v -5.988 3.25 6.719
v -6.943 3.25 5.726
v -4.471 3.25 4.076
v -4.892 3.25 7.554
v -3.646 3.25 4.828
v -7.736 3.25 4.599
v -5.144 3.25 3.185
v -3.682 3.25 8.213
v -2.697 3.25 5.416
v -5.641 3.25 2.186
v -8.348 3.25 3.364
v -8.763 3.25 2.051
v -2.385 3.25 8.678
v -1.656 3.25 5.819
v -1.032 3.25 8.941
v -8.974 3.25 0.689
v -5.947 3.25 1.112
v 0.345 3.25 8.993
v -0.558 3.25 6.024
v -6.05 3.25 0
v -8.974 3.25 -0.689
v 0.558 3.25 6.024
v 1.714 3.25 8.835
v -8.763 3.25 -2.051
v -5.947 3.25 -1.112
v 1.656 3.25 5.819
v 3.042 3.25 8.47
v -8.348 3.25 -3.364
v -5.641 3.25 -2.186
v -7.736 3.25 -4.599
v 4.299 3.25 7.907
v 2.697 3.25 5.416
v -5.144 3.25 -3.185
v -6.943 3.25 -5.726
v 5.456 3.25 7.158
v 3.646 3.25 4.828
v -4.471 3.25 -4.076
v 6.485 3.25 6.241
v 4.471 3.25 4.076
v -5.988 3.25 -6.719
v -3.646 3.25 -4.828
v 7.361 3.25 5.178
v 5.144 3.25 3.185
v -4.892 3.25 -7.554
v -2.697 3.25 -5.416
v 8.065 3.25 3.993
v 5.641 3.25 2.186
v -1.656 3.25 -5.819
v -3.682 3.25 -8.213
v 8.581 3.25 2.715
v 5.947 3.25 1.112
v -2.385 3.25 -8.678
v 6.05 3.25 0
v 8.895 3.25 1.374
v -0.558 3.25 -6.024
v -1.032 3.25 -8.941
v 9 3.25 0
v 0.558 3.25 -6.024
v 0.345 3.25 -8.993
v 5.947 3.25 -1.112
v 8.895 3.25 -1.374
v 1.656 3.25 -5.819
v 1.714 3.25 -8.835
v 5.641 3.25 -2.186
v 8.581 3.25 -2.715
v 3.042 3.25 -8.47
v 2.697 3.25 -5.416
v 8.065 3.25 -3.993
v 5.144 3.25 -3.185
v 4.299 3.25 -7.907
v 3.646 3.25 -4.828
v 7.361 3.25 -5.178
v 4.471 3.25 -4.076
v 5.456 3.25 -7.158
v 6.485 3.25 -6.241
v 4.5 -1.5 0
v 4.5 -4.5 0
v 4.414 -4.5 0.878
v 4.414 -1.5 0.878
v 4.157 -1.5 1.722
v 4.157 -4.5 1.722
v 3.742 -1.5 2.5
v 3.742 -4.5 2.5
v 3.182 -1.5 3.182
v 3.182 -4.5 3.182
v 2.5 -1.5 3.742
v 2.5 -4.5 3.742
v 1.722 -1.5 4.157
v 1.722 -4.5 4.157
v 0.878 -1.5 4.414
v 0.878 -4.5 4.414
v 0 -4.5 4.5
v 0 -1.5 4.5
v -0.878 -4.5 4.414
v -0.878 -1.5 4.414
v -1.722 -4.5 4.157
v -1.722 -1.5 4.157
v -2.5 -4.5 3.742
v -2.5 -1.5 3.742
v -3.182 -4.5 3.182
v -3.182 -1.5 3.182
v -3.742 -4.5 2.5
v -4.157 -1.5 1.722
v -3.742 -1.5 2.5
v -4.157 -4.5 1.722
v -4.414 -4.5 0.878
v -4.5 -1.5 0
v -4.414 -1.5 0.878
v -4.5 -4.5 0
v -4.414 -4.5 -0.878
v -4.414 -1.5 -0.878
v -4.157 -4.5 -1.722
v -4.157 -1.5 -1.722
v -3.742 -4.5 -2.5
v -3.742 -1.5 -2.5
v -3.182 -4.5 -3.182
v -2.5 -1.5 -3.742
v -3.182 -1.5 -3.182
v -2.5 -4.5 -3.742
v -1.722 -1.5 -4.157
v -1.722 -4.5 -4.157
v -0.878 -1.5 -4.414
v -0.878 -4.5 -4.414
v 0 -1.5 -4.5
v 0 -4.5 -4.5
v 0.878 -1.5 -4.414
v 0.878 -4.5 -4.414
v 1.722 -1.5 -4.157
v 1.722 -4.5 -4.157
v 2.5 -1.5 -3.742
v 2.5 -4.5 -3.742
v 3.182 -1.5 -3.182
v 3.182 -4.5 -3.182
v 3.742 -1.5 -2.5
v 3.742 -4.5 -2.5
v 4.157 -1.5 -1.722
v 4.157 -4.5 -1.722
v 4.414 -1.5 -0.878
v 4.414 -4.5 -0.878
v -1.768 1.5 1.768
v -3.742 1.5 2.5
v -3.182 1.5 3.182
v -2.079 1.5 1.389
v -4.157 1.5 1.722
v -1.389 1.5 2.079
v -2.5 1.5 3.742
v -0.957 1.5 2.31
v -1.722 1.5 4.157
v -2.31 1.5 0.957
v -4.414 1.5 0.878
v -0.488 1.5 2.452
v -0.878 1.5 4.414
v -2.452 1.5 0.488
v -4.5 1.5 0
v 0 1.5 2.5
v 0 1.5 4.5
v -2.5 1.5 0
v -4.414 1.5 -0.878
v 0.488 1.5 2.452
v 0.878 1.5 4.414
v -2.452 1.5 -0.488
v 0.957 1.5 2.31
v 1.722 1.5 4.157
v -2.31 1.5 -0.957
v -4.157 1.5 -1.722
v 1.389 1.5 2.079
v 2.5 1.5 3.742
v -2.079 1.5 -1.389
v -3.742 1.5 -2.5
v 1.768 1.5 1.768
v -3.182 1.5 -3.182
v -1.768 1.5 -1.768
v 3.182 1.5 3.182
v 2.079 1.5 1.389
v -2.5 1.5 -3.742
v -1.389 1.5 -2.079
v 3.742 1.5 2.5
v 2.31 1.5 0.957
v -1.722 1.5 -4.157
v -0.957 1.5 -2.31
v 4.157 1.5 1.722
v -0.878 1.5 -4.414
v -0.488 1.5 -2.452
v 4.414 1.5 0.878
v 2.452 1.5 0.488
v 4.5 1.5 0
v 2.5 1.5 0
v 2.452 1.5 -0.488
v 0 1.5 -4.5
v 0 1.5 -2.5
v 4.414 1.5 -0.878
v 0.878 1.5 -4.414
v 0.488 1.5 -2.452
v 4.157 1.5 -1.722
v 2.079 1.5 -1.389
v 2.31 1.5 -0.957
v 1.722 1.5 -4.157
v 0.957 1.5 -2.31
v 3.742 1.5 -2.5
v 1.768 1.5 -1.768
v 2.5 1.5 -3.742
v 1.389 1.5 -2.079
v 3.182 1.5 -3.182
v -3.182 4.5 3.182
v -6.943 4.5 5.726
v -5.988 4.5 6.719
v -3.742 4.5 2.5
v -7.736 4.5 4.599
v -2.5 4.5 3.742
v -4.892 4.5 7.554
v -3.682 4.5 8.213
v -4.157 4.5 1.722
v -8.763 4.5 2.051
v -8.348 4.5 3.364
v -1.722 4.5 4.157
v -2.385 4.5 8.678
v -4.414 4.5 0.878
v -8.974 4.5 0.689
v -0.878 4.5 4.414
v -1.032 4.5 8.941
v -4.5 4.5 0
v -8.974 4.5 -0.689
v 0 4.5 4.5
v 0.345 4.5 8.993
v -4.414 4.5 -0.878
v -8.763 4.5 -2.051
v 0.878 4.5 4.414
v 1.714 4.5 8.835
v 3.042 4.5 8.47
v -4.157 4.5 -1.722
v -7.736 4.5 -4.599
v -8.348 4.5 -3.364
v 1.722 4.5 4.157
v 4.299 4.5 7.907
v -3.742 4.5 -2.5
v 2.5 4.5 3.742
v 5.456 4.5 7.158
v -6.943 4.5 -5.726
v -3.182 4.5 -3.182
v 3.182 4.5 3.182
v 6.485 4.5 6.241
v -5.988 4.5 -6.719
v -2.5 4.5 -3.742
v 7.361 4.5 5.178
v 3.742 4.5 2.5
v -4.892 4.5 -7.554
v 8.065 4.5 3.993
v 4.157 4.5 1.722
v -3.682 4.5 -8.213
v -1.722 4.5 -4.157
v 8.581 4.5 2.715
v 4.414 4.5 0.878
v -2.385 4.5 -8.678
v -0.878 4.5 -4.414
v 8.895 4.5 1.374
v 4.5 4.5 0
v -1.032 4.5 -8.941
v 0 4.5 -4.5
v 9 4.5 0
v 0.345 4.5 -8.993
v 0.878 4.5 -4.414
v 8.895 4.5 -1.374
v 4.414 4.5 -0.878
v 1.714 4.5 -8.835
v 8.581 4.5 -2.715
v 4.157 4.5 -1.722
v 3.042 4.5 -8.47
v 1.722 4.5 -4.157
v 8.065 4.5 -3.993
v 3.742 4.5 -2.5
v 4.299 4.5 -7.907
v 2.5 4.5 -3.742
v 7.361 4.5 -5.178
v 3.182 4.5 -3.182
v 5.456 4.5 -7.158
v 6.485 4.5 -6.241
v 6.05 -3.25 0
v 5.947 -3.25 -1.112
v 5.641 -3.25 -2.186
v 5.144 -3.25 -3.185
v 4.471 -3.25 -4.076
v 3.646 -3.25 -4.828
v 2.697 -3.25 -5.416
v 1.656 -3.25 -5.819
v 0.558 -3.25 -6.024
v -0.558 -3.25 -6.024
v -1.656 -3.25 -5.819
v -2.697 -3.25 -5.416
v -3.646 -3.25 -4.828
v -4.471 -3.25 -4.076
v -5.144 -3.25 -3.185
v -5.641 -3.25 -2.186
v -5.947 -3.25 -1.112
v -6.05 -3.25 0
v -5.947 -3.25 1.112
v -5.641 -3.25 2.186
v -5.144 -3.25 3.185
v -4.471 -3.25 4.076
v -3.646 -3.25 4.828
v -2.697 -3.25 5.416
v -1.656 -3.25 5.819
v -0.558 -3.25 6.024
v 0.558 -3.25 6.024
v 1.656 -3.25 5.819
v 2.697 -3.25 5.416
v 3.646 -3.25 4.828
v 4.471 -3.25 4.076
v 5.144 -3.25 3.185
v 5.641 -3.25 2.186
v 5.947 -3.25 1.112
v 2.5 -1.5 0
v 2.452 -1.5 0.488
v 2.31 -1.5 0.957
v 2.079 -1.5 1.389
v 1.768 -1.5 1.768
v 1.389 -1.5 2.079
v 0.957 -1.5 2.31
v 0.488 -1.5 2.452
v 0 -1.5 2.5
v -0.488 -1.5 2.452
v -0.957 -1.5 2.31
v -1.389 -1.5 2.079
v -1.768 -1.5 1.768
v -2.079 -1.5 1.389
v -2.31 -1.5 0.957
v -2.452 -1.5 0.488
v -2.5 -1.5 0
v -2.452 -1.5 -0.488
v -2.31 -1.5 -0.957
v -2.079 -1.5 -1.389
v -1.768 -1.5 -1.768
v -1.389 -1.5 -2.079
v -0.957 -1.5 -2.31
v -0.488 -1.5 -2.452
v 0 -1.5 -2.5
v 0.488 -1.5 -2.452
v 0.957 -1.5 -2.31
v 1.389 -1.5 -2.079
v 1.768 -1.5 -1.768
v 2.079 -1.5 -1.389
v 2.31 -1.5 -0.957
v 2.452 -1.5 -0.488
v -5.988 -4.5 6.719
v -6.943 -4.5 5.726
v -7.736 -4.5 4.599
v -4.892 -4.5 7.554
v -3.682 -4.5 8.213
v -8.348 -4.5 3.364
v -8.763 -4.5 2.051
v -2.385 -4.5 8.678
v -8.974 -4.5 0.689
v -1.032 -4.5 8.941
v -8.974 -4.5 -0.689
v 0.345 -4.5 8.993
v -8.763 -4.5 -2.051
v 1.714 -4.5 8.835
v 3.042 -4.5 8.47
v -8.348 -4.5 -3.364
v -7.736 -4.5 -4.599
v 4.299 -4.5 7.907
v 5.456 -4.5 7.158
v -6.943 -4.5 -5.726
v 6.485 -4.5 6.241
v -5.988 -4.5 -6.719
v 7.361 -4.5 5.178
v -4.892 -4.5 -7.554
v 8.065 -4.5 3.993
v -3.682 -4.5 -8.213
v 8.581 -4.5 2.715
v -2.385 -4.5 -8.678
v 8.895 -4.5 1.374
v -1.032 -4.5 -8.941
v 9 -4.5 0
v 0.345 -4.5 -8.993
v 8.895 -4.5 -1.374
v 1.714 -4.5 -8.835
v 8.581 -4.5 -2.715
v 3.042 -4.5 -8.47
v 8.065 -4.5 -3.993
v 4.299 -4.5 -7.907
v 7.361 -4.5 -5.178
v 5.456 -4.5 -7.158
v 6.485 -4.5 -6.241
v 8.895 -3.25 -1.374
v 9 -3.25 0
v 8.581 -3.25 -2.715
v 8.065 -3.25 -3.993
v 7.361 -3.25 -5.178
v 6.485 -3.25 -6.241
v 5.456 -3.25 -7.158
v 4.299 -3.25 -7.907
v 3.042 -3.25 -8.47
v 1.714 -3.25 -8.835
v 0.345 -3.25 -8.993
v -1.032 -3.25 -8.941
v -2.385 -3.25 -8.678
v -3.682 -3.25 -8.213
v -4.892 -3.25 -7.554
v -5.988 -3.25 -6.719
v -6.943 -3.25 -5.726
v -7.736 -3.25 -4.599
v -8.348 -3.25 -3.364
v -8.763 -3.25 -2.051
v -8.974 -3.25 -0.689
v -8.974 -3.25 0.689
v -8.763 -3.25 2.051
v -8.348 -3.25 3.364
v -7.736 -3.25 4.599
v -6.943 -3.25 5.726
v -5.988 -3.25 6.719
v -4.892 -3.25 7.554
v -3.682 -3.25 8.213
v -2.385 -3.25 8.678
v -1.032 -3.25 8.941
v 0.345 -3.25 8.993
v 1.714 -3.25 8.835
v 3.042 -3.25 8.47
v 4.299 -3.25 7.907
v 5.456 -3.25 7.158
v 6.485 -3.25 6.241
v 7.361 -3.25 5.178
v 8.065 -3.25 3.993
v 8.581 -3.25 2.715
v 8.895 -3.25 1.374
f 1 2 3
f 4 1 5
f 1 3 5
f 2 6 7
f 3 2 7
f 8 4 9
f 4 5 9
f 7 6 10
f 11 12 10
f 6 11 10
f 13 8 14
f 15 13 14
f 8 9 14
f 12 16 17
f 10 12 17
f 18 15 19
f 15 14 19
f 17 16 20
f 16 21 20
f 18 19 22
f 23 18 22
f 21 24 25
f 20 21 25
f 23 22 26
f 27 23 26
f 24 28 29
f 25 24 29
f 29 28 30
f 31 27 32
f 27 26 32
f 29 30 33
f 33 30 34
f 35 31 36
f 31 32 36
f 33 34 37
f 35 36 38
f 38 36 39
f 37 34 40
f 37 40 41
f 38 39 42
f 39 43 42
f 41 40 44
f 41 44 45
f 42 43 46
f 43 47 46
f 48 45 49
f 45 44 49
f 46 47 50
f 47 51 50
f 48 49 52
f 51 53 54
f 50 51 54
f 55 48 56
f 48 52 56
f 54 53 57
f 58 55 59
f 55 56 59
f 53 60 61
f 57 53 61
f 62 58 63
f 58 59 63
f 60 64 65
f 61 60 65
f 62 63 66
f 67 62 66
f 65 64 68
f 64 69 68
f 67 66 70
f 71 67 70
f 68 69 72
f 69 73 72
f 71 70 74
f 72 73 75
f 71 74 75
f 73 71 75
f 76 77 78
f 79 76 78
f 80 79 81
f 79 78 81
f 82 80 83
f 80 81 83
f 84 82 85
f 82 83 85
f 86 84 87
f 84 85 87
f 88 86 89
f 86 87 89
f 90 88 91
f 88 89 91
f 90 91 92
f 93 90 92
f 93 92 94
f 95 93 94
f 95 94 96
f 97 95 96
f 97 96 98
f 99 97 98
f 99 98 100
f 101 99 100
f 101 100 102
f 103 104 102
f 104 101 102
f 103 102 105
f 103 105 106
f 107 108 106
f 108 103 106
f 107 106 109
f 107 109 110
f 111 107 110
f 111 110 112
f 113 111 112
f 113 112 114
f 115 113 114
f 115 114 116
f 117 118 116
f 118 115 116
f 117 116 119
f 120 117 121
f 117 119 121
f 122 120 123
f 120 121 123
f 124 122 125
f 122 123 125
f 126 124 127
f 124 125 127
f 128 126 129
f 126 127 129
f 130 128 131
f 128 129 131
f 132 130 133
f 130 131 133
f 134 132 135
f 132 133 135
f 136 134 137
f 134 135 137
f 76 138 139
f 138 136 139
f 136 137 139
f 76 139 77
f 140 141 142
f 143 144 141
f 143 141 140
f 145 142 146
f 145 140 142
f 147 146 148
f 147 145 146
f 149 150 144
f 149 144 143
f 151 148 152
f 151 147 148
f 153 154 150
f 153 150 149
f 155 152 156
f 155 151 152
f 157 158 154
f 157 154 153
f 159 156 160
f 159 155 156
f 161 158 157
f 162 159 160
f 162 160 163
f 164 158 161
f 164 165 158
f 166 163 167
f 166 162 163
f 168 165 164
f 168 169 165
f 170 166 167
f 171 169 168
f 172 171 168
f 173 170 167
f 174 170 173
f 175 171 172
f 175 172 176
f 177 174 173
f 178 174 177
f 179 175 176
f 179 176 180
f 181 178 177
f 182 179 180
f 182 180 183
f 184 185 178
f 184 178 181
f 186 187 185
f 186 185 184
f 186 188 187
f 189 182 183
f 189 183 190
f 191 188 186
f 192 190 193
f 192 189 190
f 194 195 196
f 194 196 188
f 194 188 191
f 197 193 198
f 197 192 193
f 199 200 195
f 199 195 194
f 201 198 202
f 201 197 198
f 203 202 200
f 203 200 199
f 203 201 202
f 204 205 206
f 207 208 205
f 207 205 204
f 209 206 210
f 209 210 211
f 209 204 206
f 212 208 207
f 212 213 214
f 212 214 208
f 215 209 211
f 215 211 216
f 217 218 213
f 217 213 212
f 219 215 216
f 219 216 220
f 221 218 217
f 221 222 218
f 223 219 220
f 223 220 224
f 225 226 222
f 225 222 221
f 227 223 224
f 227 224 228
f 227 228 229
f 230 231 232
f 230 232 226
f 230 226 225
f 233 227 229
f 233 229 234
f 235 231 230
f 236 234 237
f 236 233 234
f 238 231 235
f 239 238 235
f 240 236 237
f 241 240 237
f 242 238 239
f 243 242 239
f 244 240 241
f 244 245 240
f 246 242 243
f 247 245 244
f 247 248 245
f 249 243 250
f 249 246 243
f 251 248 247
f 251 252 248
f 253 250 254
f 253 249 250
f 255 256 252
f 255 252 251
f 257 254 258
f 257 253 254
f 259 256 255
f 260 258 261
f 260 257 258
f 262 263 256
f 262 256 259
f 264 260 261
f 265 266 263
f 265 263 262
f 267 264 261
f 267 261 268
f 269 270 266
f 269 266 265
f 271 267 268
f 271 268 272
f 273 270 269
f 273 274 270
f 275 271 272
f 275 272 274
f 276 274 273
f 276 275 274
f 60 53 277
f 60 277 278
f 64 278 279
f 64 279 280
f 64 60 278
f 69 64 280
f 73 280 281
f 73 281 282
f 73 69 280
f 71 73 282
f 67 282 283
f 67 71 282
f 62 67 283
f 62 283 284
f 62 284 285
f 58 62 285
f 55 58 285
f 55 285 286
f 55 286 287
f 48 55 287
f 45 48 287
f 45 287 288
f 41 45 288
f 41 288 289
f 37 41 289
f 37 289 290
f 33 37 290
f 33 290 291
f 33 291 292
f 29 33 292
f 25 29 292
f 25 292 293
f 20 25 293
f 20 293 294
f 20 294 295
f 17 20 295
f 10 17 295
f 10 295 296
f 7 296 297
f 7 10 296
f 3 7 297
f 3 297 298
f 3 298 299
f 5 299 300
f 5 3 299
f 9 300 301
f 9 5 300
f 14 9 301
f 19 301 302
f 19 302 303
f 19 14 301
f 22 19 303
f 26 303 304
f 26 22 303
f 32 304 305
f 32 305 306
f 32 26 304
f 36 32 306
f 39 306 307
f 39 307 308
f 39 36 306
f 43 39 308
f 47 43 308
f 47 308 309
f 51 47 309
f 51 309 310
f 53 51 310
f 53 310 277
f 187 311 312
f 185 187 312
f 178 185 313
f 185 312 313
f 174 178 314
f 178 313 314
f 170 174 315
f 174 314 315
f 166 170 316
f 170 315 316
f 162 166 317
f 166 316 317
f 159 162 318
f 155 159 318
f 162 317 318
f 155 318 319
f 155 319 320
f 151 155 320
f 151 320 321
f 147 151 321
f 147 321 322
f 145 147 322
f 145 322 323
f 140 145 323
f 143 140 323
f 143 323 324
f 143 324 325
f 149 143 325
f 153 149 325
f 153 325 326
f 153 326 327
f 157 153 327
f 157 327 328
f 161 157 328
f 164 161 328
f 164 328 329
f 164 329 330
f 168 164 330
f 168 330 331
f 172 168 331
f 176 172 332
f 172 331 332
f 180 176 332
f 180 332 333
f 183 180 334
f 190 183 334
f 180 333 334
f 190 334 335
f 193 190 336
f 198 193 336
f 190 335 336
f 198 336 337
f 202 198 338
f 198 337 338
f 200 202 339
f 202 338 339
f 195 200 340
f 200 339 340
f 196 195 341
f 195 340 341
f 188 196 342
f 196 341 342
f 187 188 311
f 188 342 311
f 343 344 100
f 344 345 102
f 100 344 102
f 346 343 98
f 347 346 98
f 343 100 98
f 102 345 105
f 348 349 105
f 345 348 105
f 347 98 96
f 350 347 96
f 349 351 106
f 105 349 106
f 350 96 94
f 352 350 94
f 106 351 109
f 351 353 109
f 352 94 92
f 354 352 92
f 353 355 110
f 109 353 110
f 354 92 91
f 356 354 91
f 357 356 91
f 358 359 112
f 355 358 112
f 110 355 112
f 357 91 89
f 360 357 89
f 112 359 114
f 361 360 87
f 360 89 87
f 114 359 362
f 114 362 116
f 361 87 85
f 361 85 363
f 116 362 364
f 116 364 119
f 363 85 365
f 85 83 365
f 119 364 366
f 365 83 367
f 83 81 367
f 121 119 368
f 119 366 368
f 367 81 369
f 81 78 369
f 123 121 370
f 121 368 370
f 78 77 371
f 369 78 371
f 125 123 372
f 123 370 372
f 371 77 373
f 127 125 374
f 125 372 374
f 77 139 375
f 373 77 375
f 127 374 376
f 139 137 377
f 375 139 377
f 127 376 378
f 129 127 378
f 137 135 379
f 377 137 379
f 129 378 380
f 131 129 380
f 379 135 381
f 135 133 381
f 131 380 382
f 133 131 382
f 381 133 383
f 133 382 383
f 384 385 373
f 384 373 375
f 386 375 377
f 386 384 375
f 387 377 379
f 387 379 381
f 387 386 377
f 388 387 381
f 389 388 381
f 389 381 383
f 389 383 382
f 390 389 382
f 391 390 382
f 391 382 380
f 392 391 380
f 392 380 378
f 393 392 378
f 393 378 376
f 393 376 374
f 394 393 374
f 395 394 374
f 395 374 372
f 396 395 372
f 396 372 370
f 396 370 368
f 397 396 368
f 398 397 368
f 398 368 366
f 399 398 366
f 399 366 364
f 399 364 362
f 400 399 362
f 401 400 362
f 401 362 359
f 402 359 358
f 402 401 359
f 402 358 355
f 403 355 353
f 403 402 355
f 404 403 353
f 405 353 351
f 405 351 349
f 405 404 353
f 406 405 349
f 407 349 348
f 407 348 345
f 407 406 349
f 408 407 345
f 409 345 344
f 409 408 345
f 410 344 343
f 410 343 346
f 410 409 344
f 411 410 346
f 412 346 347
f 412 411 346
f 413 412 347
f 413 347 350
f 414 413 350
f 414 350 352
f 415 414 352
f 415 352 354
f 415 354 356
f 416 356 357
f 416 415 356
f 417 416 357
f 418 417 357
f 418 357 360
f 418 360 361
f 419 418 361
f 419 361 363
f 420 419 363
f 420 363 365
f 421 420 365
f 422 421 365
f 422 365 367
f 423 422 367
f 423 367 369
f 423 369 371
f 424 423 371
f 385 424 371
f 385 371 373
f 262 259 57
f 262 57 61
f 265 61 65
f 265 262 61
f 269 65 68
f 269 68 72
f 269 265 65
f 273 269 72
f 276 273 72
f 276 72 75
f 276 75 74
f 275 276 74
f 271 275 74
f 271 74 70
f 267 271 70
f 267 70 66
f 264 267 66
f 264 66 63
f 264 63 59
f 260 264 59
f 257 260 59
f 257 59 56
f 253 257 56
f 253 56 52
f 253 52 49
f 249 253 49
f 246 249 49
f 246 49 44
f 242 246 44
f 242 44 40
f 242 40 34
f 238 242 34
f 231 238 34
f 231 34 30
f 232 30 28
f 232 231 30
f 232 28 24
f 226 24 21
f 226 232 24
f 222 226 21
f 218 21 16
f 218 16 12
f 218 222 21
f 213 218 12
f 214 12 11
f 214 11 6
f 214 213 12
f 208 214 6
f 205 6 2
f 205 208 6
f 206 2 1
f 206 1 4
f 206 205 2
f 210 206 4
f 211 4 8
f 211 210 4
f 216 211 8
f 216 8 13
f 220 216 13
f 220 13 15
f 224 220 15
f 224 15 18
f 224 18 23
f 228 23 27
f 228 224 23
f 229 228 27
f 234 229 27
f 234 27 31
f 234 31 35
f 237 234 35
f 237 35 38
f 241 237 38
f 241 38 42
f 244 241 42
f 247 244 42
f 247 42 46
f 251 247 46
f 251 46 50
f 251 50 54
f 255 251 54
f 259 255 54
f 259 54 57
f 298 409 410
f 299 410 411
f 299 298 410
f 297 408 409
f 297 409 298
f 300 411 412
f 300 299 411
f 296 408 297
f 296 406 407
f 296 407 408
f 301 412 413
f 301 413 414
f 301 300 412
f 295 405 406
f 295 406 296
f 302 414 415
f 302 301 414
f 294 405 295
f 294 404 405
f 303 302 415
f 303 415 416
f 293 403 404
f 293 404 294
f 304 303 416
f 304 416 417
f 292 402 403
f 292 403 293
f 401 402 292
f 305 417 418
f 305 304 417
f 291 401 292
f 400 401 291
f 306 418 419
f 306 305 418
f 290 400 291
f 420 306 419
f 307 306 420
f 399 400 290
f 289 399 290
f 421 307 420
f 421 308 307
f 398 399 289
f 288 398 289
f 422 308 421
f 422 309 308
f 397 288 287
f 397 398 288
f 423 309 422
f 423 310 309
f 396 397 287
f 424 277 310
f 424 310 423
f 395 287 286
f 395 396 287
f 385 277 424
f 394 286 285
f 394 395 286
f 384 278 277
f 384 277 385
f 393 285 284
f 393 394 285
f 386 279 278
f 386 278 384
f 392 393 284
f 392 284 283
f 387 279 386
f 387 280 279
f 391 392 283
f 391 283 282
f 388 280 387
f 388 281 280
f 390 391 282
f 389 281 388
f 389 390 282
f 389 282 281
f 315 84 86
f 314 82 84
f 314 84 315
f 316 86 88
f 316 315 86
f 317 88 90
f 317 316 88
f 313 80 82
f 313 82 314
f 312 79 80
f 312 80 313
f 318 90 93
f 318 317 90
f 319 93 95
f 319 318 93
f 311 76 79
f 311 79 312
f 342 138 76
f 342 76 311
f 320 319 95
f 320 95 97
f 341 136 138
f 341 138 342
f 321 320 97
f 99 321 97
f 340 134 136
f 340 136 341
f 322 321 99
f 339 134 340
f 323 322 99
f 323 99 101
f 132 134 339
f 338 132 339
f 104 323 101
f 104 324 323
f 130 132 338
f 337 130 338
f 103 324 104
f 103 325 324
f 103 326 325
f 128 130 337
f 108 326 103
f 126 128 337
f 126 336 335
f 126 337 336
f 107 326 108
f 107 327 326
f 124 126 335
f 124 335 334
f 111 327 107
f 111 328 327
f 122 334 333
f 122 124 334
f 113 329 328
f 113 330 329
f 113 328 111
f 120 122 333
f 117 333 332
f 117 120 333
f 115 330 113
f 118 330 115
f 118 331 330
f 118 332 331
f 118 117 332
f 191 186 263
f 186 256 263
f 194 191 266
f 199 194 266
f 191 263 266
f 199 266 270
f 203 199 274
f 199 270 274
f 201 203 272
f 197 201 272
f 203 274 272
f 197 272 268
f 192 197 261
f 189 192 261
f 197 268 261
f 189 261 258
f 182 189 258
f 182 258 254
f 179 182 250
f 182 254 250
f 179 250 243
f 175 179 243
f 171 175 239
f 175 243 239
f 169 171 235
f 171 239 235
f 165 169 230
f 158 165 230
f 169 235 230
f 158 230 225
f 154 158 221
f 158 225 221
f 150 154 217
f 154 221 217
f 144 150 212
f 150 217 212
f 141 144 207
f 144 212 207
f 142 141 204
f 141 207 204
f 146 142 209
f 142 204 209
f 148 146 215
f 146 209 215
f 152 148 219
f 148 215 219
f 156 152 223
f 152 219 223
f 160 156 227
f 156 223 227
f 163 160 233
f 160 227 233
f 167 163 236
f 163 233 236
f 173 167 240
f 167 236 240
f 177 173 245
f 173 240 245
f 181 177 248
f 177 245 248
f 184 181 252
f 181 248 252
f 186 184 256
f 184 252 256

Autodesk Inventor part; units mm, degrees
ref_plane "YZ Plane" through (0, 0, 0) normal (1, 0, 0) x (0, 1, 0)
ref_plane "XZ Plane" through (0, 0, 0) normal (0, 1, 0) x (-1, 0, 0)
ref_plane "XY Plane" through (0, 0, 0) normal (0, 0, 1) x (1, 0, 0)
sketch "Sketch1" plane through (0, 0, 0) normal (0, 0, 1) x (1, 0, 0)
  line L0 (0, 0) -> (2.5, 0) construction
  line L1 (2.5, 4.5) -> (2.5, -4.5)
  line L2 (2.5, -4.5) -> (9, -4.5)
  line L3 (9, -4.5) -> (9, -3.25)
  line L4 (9, -3.25) -> (6.05, -3.25)
  line L5 (6.05, -3.25) -> (6.05, 3.25)
  line L6 (6.05, 3.25) -> (9, 3.25)
  line L7 (9, 3.25) -> (9, 4.5)
  line L8 (9, 4.5) -> (2.5, 4.5)
  line L9 (0, -6.3) -> (0, 6.3) projected
  dimension "d0" = 2.5
  dimension "d1" = 6.5
  dimension "d2" = 9
  dimension "d3" = 9
  dimension "d4" = 6.05
revolve "Revolution1" add sketch "Sketch1" angle 360 about axis through (0, -10, 0) along (0, 1, 0)
sketch "Sketch2" plane through (0, 4.5, 0) normal (0, 1, 0) x (1, 0, 0)
  circle A0 centre (0, 0) radius 4.5
  dimension "d6" = 9
extrude "Extrusion1" cut sketch "Sketch2" against normal blind 3
mirror "Mirror1" about plane through (0, 0, 0) normal (0, 1, 0) of "Extrusion1"
properties part number "Idler Pulley" material "Aluminum 6061"
